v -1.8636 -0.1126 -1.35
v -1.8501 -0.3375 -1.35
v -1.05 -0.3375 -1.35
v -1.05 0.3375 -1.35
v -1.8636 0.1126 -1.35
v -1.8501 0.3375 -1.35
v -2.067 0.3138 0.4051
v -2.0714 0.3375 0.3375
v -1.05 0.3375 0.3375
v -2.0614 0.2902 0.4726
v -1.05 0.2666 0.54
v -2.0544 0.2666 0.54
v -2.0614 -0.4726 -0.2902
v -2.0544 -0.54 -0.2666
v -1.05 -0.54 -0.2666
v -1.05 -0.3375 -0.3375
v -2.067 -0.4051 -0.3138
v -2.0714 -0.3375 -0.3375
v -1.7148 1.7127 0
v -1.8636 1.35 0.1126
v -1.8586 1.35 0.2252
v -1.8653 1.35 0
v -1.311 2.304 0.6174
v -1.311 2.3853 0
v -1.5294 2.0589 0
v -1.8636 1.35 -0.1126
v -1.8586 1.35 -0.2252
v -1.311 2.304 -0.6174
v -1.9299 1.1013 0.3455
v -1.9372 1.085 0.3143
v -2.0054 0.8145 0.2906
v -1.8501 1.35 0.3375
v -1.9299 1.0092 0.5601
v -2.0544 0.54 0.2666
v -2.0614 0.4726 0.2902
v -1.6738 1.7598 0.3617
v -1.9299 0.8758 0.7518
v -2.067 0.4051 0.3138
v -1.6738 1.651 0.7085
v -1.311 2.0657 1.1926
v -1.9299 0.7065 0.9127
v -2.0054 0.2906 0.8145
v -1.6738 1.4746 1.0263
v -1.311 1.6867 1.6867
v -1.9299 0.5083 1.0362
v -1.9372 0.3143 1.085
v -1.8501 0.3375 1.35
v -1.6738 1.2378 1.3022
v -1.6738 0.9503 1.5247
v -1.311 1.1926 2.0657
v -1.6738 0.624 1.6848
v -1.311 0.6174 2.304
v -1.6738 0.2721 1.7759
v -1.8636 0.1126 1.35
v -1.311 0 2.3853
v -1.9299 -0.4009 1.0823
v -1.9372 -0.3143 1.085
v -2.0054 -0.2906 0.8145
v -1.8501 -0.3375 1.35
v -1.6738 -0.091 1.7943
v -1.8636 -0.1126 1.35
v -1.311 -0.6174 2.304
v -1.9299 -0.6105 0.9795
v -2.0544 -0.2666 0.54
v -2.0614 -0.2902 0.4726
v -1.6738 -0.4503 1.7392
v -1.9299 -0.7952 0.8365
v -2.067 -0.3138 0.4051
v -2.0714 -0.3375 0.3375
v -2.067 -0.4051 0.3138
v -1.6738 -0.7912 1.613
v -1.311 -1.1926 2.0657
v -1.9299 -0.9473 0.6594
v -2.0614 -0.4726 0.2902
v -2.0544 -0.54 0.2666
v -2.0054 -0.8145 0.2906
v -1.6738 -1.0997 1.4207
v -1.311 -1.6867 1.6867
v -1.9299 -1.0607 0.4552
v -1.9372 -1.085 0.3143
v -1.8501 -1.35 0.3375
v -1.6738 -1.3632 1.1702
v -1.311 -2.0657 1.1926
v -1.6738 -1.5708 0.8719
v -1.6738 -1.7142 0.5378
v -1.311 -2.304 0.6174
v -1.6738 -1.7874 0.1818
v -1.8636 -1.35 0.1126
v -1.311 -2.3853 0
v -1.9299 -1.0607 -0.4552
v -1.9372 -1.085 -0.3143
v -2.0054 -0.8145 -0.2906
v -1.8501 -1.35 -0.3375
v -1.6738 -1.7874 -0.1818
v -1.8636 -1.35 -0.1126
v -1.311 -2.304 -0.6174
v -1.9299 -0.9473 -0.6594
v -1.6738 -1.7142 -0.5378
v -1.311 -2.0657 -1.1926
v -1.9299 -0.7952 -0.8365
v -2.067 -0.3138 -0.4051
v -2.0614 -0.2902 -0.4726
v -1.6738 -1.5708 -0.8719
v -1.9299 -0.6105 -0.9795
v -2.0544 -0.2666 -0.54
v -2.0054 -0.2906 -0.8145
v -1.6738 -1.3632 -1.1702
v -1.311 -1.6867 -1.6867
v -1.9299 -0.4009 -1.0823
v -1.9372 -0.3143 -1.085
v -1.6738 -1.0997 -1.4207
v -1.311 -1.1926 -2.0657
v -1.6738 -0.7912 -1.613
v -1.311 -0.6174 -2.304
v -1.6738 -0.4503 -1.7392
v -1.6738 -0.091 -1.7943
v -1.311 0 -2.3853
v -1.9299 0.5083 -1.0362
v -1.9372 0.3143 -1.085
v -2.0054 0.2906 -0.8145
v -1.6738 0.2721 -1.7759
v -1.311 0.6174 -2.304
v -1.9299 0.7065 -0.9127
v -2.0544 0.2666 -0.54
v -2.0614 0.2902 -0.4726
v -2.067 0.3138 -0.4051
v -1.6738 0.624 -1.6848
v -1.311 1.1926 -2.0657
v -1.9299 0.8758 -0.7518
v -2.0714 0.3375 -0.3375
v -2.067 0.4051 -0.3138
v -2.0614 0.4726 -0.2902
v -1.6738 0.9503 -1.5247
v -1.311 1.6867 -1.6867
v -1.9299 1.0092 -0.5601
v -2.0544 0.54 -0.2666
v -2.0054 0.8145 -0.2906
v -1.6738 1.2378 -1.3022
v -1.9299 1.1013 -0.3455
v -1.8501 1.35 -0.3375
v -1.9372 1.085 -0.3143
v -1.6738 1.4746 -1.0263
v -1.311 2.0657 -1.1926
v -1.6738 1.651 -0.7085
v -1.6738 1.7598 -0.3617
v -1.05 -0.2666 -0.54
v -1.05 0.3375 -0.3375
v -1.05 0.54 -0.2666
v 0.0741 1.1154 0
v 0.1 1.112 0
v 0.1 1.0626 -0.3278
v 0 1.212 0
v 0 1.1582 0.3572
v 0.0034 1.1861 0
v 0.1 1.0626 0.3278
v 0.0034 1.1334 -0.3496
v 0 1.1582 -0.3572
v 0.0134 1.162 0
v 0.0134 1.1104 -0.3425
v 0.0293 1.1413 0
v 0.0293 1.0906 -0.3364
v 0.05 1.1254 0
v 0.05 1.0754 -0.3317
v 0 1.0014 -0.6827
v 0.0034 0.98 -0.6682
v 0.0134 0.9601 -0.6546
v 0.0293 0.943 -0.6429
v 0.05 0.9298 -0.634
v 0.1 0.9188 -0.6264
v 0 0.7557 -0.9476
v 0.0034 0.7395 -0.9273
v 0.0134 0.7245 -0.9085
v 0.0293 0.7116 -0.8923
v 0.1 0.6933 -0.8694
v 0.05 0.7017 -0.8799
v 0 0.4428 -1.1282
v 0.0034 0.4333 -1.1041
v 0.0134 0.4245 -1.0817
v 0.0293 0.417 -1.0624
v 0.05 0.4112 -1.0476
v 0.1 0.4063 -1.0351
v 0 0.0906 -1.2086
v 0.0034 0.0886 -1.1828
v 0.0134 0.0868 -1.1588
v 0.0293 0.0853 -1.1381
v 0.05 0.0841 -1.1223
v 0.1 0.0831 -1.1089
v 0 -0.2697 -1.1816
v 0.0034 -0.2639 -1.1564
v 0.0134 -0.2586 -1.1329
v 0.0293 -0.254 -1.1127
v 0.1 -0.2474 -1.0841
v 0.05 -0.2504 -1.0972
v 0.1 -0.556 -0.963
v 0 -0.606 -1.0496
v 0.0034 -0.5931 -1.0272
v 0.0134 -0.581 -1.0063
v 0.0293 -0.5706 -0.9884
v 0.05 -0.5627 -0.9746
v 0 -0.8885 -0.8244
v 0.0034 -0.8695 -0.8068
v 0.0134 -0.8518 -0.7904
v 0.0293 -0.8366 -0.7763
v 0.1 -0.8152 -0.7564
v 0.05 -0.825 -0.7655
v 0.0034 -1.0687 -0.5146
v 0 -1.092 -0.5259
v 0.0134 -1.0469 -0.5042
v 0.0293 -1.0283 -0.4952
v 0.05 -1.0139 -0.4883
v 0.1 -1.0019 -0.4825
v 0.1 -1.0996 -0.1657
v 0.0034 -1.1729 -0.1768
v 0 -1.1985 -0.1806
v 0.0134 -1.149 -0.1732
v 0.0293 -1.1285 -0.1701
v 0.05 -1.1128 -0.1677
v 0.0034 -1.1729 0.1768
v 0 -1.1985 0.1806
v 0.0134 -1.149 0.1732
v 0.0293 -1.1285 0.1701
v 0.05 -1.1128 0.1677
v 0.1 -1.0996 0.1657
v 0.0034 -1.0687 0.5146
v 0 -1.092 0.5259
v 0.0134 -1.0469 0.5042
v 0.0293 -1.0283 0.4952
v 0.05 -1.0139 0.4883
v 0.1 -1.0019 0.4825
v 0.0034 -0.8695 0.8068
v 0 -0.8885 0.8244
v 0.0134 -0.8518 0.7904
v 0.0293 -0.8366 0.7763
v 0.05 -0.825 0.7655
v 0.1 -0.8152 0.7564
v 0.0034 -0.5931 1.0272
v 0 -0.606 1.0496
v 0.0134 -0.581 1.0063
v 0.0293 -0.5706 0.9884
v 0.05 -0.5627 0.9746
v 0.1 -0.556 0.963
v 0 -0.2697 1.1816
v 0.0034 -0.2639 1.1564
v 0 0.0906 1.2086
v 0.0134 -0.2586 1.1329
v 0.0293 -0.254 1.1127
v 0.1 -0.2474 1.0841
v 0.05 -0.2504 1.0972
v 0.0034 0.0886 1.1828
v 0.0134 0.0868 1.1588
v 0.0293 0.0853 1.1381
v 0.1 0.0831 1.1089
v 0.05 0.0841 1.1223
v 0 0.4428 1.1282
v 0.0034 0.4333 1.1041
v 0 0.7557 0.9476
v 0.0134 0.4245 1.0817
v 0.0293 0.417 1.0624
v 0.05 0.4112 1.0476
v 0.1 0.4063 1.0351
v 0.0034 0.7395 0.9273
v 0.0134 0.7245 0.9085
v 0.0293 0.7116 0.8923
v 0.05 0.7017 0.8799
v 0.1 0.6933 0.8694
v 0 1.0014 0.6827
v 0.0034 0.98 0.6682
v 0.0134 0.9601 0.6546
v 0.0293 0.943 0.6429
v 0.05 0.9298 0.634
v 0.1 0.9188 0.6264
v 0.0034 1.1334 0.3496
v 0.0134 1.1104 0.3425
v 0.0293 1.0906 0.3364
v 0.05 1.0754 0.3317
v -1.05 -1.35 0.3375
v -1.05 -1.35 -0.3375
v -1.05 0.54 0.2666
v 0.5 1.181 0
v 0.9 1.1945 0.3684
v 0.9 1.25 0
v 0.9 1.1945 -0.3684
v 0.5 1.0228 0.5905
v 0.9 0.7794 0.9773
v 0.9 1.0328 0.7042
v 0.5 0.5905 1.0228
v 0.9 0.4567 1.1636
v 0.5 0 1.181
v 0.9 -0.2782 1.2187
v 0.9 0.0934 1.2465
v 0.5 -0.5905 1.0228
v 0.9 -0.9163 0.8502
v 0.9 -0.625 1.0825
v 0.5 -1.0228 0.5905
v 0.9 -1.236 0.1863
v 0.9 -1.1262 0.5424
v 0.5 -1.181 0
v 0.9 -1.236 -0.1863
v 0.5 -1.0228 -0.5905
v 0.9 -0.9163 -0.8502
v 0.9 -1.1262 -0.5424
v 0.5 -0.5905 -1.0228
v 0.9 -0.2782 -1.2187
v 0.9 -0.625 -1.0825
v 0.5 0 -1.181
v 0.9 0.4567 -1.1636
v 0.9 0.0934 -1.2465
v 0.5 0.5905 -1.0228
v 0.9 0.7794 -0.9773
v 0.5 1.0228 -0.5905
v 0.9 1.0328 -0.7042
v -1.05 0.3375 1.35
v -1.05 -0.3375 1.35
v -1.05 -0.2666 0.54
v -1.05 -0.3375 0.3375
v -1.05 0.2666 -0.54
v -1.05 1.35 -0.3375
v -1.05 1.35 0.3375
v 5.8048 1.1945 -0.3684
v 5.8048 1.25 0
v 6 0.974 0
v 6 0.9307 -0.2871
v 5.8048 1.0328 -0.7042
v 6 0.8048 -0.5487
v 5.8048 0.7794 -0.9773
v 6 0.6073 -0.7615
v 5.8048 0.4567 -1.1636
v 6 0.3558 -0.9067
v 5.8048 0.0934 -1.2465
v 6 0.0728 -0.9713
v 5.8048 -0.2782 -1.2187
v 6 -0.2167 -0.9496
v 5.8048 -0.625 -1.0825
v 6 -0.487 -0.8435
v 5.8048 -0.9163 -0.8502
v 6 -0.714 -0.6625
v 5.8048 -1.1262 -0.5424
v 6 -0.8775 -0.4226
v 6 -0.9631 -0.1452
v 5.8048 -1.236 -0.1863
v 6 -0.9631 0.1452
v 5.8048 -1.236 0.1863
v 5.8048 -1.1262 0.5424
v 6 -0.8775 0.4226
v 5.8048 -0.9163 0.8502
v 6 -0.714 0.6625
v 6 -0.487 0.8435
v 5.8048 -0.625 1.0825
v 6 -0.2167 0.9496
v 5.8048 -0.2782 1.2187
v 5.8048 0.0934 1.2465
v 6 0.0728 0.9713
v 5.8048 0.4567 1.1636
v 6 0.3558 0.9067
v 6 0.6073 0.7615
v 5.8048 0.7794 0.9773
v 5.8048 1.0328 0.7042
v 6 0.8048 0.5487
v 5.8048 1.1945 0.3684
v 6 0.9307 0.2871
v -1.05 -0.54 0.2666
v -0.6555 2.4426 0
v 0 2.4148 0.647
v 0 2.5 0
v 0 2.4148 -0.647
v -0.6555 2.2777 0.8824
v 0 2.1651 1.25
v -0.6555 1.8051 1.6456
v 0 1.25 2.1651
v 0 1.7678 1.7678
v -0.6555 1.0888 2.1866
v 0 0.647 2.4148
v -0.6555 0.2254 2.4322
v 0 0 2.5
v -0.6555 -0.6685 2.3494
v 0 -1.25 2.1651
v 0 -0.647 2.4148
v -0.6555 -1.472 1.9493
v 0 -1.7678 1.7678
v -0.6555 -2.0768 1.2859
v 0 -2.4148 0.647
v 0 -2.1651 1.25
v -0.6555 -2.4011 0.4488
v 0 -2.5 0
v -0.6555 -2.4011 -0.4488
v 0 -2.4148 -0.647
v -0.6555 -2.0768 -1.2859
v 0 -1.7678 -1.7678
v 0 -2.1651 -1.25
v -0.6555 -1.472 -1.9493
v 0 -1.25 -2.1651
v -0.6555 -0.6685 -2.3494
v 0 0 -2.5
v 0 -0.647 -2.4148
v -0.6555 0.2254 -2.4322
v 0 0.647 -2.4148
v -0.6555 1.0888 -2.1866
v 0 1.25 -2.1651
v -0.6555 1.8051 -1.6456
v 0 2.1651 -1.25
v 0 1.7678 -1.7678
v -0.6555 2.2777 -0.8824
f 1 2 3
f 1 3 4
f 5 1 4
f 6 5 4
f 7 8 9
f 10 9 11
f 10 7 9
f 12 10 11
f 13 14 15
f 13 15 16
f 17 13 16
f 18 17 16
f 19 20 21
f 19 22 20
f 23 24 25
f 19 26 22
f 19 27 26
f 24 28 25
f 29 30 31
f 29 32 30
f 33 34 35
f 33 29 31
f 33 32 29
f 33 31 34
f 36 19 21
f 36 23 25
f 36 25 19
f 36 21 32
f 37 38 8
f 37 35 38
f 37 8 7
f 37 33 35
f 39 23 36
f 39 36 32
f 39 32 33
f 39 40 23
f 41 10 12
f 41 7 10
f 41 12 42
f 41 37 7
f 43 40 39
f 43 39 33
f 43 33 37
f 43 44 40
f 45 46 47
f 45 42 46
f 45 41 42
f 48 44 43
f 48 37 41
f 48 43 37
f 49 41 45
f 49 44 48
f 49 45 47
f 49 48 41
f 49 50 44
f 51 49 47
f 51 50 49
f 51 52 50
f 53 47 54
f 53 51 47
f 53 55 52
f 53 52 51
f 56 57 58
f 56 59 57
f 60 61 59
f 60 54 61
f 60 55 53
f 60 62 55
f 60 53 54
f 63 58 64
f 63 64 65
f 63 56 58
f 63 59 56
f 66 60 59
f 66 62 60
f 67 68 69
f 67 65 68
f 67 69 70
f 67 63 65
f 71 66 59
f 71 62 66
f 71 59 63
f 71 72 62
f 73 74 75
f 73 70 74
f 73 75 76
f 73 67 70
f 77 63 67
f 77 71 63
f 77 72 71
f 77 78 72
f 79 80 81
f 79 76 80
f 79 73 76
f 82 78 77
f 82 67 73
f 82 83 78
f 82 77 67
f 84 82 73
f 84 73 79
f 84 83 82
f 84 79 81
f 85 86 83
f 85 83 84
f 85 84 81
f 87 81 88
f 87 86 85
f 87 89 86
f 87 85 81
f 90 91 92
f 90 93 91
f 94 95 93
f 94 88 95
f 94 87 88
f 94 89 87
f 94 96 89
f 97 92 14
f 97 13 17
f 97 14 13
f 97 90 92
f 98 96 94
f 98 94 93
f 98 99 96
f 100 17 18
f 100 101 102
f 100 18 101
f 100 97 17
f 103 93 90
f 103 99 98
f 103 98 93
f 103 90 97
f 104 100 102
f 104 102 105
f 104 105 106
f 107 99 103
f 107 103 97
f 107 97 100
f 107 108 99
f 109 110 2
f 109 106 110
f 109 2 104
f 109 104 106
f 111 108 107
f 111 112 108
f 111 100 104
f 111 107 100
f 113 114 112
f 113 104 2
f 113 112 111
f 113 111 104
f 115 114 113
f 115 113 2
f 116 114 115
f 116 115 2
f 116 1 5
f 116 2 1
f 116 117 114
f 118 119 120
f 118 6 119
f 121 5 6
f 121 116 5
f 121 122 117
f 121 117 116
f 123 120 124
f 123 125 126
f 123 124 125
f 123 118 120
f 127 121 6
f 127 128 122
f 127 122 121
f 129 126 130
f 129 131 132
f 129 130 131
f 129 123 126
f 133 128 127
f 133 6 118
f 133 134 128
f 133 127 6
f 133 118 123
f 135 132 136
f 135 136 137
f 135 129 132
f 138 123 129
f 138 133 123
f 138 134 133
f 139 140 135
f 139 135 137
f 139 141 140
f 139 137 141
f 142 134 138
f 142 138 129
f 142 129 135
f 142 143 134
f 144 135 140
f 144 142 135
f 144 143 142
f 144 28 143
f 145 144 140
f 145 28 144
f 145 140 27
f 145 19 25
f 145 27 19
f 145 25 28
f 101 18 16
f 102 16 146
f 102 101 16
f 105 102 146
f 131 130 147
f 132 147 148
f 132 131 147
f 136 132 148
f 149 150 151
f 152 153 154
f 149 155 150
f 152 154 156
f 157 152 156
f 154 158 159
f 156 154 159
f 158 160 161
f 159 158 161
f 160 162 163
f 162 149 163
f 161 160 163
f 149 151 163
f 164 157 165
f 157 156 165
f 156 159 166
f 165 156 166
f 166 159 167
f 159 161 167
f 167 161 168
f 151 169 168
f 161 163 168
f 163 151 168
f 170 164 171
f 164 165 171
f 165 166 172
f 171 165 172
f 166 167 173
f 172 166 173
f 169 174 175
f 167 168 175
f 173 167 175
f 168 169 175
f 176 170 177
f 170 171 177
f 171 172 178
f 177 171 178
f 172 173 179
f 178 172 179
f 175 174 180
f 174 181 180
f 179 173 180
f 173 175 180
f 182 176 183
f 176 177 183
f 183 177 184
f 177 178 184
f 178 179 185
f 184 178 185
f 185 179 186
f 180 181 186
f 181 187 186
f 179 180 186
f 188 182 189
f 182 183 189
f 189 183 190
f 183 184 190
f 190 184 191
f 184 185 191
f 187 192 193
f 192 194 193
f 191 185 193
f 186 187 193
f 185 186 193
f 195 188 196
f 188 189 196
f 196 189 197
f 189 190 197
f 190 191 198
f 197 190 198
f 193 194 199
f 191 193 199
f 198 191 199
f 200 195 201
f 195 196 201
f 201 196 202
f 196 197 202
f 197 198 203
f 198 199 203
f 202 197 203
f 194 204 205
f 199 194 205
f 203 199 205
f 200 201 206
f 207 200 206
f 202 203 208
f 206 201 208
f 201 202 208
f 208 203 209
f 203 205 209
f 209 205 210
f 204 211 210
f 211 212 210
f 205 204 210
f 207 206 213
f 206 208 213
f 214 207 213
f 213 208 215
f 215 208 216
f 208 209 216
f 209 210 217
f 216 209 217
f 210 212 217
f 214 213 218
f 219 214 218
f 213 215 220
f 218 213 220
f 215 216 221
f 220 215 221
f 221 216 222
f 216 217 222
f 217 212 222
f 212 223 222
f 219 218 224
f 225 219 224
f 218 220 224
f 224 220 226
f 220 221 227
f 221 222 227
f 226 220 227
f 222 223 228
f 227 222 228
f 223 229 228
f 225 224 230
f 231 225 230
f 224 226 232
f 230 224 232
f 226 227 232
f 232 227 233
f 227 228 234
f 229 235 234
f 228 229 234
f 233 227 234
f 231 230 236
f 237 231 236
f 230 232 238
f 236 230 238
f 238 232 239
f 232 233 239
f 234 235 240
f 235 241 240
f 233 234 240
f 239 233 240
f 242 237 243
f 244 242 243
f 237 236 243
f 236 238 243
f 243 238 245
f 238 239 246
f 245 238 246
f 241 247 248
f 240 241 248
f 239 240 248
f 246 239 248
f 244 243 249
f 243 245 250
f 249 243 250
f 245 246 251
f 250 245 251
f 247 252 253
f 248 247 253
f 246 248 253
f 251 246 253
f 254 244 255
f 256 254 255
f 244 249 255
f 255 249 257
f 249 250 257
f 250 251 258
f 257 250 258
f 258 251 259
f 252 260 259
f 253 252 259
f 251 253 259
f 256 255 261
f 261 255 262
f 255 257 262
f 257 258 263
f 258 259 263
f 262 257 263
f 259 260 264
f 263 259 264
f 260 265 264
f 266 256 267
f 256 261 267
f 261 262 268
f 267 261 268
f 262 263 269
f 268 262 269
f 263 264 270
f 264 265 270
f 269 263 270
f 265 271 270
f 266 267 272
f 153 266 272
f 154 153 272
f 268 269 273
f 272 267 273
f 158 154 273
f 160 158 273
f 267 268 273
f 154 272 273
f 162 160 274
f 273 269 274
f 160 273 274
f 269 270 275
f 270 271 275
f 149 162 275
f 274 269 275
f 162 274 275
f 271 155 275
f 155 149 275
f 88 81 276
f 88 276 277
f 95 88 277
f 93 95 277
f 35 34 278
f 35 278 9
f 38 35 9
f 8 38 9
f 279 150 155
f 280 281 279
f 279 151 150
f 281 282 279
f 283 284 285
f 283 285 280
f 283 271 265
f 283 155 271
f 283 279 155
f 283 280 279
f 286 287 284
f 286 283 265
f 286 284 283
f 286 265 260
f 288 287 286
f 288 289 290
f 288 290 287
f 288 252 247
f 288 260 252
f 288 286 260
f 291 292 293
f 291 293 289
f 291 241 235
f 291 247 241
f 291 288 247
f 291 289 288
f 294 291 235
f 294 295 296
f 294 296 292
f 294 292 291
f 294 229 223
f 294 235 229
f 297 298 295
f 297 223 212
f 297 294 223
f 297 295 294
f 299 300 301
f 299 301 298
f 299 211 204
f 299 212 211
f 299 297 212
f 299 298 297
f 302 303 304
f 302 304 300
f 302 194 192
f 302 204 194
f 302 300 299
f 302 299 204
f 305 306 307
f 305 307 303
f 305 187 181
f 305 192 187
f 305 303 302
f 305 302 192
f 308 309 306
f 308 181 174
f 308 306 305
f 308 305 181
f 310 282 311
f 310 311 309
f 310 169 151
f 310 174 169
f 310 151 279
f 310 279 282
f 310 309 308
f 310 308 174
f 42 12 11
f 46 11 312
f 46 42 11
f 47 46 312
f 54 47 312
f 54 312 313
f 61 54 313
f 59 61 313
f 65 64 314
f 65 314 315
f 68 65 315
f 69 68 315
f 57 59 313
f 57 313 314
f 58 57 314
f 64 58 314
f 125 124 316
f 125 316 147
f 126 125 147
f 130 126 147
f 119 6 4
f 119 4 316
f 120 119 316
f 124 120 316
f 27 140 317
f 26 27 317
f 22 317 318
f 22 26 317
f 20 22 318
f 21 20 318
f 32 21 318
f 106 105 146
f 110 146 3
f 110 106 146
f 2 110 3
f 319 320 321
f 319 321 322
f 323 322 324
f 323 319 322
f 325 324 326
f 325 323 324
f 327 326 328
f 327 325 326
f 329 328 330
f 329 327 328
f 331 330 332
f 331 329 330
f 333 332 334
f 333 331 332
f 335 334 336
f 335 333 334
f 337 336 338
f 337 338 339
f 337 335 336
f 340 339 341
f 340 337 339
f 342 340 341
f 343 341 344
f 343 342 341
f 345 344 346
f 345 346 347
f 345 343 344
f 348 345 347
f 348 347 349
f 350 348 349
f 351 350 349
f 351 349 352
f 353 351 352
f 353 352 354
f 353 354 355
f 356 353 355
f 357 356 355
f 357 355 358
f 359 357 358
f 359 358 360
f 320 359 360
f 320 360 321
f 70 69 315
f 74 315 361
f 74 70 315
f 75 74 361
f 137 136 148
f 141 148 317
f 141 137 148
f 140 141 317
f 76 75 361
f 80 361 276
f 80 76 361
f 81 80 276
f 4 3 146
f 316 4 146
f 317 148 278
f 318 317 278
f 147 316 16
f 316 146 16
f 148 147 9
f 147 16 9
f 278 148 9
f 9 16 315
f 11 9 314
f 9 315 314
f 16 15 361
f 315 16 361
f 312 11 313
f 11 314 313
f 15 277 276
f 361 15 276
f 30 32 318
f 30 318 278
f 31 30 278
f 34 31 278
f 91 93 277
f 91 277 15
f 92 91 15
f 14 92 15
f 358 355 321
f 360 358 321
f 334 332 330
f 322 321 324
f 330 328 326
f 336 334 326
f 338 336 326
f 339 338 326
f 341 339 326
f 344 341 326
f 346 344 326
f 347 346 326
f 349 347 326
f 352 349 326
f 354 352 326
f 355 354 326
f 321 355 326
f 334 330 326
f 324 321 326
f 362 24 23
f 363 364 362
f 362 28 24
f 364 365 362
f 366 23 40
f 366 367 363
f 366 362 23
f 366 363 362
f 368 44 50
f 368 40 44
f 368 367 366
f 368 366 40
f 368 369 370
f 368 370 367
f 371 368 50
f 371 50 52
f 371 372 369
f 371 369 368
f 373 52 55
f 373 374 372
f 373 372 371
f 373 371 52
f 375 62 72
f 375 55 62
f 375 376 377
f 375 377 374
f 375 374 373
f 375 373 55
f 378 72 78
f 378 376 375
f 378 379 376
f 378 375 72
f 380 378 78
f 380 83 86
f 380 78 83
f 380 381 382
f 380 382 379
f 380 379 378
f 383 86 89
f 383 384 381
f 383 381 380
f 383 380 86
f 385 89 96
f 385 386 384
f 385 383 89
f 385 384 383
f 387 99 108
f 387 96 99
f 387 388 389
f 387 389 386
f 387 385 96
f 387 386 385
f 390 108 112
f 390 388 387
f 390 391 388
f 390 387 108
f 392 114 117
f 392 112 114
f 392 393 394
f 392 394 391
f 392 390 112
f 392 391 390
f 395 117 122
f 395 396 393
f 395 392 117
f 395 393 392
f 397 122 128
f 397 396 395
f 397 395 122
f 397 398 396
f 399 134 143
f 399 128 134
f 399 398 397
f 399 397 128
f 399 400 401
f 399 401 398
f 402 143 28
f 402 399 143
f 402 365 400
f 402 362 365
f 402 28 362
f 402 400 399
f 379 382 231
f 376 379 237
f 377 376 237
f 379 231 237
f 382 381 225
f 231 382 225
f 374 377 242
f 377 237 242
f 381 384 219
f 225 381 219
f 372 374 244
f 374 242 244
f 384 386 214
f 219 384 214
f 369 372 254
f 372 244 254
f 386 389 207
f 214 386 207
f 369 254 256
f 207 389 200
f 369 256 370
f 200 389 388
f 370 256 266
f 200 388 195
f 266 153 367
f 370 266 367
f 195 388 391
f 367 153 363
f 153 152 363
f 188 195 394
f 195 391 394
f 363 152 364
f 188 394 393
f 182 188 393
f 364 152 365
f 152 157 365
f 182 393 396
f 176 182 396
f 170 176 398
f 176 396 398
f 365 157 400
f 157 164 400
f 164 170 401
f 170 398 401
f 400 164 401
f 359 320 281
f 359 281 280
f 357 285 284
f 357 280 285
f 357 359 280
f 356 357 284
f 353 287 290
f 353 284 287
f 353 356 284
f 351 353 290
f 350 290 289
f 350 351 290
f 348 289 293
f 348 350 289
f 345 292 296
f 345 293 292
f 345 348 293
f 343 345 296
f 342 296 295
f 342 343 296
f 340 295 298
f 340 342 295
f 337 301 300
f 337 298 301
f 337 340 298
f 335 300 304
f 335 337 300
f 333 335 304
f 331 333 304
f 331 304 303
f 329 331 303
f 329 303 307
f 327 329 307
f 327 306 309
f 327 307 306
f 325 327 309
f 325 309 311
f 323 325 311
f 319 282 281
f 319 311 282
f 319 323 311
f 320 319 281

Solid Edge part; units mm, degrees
sketch "Sketch1" plane through (0, 0, 0) normal (0, 0, 1) x (1, 0, 0)
  arc A0 (-2.1, 0) -> (-1.311, 2.3853) centre (1.9, 0) cw
  line L0 (-1.311, 2.3853) -> (0, 2.5)
  line L1 (0, 2.5) -> (0, 1.212)
  arc A1 (0, 1.212) -> (0.1, 1.112) centre (0.1, 1.212) ccw
  line L2 (0.1, 1.112) -> (0.9, 1.25)
  line L3 (0.9, 1.25) -> (5.8048, 1.25)
  line L4 (5.8048, 1.25) -> (6, 0.974)
  line L5 (6, 0.974) -> (6, 0)
  line L6 (6, 0) -> (-2.1, 0)
revolve "RevolvedProtrusion1" add sketch "Sketch1" angle 360 about axis through (6, 0, 0) along (-1, 0, 0)
sketch "Sketch2" plane through (-2.1, 0, 0) normal (1, 0, 0) x (0, 1, 0)
  line L0 (0.3375, 1.35) -> (-0.3375, 1.35)
  line L1 (-0.3375, 1.35) -> (-0.2666, 0.54)
  line L2 (-0.2666, 0.54) -> (-0.3375, 0.3375)
  line L3 (-0.3375, 0.3375) -> (-0.54, 0.2666)
  line L4 (-0.54, 0.2666) -> (-1.35, 0.3375)
  line L5 (-1.35, 0.3375) -> (-1.35, -0.3375)
  line L6 (-1.35, -0.3375) -> (-0.54, -0.2666)
  line L7 (-0.54, -0.2666) -> (-0.3375, -0.3375)
  line L8 (-0.3375, -0.3375) -> (-0.2666, -0.54)
  line L9 (-0.2666, -0.54) -> (-0.3375, -1.35)
  line L10 (-0.3375, -1.35) -> (0.3375, -1.35)
  line L11 (0.3375, -1.35) -> (0.2666, -0.54)
  line L12 (0.2666, -0.54) -> (0.3375, -0.3375)
  line L13 (0.3375, -0.3375) -> (0.54, -0.2666)
  line L14 (0.54, -0.2666) -> (1.35, -0.3375)
  line L15 (1.35, -0.3375) -> (1.35, 0.3375)
  line L16 (1.35, 0.3375) -> (0.54, 0.2666)
  line L17 (0.54, 0.2666) -> (0.3375, 0.3375)
  line L18 (0.3375, 0.3375) -> (0.2666, 0.54)
  line L19 (0.2666, 0.54) -> (0.3375, 1.35)
extrude "ExtrudedCutout_1" cut sketch "Sketch2" along normal blind 1.05
properties part number "SFS FN 405 146084 Flachkopfschraube ISO 7045 Stahl 4.8 verzinkt blau M2.5x6-H"
